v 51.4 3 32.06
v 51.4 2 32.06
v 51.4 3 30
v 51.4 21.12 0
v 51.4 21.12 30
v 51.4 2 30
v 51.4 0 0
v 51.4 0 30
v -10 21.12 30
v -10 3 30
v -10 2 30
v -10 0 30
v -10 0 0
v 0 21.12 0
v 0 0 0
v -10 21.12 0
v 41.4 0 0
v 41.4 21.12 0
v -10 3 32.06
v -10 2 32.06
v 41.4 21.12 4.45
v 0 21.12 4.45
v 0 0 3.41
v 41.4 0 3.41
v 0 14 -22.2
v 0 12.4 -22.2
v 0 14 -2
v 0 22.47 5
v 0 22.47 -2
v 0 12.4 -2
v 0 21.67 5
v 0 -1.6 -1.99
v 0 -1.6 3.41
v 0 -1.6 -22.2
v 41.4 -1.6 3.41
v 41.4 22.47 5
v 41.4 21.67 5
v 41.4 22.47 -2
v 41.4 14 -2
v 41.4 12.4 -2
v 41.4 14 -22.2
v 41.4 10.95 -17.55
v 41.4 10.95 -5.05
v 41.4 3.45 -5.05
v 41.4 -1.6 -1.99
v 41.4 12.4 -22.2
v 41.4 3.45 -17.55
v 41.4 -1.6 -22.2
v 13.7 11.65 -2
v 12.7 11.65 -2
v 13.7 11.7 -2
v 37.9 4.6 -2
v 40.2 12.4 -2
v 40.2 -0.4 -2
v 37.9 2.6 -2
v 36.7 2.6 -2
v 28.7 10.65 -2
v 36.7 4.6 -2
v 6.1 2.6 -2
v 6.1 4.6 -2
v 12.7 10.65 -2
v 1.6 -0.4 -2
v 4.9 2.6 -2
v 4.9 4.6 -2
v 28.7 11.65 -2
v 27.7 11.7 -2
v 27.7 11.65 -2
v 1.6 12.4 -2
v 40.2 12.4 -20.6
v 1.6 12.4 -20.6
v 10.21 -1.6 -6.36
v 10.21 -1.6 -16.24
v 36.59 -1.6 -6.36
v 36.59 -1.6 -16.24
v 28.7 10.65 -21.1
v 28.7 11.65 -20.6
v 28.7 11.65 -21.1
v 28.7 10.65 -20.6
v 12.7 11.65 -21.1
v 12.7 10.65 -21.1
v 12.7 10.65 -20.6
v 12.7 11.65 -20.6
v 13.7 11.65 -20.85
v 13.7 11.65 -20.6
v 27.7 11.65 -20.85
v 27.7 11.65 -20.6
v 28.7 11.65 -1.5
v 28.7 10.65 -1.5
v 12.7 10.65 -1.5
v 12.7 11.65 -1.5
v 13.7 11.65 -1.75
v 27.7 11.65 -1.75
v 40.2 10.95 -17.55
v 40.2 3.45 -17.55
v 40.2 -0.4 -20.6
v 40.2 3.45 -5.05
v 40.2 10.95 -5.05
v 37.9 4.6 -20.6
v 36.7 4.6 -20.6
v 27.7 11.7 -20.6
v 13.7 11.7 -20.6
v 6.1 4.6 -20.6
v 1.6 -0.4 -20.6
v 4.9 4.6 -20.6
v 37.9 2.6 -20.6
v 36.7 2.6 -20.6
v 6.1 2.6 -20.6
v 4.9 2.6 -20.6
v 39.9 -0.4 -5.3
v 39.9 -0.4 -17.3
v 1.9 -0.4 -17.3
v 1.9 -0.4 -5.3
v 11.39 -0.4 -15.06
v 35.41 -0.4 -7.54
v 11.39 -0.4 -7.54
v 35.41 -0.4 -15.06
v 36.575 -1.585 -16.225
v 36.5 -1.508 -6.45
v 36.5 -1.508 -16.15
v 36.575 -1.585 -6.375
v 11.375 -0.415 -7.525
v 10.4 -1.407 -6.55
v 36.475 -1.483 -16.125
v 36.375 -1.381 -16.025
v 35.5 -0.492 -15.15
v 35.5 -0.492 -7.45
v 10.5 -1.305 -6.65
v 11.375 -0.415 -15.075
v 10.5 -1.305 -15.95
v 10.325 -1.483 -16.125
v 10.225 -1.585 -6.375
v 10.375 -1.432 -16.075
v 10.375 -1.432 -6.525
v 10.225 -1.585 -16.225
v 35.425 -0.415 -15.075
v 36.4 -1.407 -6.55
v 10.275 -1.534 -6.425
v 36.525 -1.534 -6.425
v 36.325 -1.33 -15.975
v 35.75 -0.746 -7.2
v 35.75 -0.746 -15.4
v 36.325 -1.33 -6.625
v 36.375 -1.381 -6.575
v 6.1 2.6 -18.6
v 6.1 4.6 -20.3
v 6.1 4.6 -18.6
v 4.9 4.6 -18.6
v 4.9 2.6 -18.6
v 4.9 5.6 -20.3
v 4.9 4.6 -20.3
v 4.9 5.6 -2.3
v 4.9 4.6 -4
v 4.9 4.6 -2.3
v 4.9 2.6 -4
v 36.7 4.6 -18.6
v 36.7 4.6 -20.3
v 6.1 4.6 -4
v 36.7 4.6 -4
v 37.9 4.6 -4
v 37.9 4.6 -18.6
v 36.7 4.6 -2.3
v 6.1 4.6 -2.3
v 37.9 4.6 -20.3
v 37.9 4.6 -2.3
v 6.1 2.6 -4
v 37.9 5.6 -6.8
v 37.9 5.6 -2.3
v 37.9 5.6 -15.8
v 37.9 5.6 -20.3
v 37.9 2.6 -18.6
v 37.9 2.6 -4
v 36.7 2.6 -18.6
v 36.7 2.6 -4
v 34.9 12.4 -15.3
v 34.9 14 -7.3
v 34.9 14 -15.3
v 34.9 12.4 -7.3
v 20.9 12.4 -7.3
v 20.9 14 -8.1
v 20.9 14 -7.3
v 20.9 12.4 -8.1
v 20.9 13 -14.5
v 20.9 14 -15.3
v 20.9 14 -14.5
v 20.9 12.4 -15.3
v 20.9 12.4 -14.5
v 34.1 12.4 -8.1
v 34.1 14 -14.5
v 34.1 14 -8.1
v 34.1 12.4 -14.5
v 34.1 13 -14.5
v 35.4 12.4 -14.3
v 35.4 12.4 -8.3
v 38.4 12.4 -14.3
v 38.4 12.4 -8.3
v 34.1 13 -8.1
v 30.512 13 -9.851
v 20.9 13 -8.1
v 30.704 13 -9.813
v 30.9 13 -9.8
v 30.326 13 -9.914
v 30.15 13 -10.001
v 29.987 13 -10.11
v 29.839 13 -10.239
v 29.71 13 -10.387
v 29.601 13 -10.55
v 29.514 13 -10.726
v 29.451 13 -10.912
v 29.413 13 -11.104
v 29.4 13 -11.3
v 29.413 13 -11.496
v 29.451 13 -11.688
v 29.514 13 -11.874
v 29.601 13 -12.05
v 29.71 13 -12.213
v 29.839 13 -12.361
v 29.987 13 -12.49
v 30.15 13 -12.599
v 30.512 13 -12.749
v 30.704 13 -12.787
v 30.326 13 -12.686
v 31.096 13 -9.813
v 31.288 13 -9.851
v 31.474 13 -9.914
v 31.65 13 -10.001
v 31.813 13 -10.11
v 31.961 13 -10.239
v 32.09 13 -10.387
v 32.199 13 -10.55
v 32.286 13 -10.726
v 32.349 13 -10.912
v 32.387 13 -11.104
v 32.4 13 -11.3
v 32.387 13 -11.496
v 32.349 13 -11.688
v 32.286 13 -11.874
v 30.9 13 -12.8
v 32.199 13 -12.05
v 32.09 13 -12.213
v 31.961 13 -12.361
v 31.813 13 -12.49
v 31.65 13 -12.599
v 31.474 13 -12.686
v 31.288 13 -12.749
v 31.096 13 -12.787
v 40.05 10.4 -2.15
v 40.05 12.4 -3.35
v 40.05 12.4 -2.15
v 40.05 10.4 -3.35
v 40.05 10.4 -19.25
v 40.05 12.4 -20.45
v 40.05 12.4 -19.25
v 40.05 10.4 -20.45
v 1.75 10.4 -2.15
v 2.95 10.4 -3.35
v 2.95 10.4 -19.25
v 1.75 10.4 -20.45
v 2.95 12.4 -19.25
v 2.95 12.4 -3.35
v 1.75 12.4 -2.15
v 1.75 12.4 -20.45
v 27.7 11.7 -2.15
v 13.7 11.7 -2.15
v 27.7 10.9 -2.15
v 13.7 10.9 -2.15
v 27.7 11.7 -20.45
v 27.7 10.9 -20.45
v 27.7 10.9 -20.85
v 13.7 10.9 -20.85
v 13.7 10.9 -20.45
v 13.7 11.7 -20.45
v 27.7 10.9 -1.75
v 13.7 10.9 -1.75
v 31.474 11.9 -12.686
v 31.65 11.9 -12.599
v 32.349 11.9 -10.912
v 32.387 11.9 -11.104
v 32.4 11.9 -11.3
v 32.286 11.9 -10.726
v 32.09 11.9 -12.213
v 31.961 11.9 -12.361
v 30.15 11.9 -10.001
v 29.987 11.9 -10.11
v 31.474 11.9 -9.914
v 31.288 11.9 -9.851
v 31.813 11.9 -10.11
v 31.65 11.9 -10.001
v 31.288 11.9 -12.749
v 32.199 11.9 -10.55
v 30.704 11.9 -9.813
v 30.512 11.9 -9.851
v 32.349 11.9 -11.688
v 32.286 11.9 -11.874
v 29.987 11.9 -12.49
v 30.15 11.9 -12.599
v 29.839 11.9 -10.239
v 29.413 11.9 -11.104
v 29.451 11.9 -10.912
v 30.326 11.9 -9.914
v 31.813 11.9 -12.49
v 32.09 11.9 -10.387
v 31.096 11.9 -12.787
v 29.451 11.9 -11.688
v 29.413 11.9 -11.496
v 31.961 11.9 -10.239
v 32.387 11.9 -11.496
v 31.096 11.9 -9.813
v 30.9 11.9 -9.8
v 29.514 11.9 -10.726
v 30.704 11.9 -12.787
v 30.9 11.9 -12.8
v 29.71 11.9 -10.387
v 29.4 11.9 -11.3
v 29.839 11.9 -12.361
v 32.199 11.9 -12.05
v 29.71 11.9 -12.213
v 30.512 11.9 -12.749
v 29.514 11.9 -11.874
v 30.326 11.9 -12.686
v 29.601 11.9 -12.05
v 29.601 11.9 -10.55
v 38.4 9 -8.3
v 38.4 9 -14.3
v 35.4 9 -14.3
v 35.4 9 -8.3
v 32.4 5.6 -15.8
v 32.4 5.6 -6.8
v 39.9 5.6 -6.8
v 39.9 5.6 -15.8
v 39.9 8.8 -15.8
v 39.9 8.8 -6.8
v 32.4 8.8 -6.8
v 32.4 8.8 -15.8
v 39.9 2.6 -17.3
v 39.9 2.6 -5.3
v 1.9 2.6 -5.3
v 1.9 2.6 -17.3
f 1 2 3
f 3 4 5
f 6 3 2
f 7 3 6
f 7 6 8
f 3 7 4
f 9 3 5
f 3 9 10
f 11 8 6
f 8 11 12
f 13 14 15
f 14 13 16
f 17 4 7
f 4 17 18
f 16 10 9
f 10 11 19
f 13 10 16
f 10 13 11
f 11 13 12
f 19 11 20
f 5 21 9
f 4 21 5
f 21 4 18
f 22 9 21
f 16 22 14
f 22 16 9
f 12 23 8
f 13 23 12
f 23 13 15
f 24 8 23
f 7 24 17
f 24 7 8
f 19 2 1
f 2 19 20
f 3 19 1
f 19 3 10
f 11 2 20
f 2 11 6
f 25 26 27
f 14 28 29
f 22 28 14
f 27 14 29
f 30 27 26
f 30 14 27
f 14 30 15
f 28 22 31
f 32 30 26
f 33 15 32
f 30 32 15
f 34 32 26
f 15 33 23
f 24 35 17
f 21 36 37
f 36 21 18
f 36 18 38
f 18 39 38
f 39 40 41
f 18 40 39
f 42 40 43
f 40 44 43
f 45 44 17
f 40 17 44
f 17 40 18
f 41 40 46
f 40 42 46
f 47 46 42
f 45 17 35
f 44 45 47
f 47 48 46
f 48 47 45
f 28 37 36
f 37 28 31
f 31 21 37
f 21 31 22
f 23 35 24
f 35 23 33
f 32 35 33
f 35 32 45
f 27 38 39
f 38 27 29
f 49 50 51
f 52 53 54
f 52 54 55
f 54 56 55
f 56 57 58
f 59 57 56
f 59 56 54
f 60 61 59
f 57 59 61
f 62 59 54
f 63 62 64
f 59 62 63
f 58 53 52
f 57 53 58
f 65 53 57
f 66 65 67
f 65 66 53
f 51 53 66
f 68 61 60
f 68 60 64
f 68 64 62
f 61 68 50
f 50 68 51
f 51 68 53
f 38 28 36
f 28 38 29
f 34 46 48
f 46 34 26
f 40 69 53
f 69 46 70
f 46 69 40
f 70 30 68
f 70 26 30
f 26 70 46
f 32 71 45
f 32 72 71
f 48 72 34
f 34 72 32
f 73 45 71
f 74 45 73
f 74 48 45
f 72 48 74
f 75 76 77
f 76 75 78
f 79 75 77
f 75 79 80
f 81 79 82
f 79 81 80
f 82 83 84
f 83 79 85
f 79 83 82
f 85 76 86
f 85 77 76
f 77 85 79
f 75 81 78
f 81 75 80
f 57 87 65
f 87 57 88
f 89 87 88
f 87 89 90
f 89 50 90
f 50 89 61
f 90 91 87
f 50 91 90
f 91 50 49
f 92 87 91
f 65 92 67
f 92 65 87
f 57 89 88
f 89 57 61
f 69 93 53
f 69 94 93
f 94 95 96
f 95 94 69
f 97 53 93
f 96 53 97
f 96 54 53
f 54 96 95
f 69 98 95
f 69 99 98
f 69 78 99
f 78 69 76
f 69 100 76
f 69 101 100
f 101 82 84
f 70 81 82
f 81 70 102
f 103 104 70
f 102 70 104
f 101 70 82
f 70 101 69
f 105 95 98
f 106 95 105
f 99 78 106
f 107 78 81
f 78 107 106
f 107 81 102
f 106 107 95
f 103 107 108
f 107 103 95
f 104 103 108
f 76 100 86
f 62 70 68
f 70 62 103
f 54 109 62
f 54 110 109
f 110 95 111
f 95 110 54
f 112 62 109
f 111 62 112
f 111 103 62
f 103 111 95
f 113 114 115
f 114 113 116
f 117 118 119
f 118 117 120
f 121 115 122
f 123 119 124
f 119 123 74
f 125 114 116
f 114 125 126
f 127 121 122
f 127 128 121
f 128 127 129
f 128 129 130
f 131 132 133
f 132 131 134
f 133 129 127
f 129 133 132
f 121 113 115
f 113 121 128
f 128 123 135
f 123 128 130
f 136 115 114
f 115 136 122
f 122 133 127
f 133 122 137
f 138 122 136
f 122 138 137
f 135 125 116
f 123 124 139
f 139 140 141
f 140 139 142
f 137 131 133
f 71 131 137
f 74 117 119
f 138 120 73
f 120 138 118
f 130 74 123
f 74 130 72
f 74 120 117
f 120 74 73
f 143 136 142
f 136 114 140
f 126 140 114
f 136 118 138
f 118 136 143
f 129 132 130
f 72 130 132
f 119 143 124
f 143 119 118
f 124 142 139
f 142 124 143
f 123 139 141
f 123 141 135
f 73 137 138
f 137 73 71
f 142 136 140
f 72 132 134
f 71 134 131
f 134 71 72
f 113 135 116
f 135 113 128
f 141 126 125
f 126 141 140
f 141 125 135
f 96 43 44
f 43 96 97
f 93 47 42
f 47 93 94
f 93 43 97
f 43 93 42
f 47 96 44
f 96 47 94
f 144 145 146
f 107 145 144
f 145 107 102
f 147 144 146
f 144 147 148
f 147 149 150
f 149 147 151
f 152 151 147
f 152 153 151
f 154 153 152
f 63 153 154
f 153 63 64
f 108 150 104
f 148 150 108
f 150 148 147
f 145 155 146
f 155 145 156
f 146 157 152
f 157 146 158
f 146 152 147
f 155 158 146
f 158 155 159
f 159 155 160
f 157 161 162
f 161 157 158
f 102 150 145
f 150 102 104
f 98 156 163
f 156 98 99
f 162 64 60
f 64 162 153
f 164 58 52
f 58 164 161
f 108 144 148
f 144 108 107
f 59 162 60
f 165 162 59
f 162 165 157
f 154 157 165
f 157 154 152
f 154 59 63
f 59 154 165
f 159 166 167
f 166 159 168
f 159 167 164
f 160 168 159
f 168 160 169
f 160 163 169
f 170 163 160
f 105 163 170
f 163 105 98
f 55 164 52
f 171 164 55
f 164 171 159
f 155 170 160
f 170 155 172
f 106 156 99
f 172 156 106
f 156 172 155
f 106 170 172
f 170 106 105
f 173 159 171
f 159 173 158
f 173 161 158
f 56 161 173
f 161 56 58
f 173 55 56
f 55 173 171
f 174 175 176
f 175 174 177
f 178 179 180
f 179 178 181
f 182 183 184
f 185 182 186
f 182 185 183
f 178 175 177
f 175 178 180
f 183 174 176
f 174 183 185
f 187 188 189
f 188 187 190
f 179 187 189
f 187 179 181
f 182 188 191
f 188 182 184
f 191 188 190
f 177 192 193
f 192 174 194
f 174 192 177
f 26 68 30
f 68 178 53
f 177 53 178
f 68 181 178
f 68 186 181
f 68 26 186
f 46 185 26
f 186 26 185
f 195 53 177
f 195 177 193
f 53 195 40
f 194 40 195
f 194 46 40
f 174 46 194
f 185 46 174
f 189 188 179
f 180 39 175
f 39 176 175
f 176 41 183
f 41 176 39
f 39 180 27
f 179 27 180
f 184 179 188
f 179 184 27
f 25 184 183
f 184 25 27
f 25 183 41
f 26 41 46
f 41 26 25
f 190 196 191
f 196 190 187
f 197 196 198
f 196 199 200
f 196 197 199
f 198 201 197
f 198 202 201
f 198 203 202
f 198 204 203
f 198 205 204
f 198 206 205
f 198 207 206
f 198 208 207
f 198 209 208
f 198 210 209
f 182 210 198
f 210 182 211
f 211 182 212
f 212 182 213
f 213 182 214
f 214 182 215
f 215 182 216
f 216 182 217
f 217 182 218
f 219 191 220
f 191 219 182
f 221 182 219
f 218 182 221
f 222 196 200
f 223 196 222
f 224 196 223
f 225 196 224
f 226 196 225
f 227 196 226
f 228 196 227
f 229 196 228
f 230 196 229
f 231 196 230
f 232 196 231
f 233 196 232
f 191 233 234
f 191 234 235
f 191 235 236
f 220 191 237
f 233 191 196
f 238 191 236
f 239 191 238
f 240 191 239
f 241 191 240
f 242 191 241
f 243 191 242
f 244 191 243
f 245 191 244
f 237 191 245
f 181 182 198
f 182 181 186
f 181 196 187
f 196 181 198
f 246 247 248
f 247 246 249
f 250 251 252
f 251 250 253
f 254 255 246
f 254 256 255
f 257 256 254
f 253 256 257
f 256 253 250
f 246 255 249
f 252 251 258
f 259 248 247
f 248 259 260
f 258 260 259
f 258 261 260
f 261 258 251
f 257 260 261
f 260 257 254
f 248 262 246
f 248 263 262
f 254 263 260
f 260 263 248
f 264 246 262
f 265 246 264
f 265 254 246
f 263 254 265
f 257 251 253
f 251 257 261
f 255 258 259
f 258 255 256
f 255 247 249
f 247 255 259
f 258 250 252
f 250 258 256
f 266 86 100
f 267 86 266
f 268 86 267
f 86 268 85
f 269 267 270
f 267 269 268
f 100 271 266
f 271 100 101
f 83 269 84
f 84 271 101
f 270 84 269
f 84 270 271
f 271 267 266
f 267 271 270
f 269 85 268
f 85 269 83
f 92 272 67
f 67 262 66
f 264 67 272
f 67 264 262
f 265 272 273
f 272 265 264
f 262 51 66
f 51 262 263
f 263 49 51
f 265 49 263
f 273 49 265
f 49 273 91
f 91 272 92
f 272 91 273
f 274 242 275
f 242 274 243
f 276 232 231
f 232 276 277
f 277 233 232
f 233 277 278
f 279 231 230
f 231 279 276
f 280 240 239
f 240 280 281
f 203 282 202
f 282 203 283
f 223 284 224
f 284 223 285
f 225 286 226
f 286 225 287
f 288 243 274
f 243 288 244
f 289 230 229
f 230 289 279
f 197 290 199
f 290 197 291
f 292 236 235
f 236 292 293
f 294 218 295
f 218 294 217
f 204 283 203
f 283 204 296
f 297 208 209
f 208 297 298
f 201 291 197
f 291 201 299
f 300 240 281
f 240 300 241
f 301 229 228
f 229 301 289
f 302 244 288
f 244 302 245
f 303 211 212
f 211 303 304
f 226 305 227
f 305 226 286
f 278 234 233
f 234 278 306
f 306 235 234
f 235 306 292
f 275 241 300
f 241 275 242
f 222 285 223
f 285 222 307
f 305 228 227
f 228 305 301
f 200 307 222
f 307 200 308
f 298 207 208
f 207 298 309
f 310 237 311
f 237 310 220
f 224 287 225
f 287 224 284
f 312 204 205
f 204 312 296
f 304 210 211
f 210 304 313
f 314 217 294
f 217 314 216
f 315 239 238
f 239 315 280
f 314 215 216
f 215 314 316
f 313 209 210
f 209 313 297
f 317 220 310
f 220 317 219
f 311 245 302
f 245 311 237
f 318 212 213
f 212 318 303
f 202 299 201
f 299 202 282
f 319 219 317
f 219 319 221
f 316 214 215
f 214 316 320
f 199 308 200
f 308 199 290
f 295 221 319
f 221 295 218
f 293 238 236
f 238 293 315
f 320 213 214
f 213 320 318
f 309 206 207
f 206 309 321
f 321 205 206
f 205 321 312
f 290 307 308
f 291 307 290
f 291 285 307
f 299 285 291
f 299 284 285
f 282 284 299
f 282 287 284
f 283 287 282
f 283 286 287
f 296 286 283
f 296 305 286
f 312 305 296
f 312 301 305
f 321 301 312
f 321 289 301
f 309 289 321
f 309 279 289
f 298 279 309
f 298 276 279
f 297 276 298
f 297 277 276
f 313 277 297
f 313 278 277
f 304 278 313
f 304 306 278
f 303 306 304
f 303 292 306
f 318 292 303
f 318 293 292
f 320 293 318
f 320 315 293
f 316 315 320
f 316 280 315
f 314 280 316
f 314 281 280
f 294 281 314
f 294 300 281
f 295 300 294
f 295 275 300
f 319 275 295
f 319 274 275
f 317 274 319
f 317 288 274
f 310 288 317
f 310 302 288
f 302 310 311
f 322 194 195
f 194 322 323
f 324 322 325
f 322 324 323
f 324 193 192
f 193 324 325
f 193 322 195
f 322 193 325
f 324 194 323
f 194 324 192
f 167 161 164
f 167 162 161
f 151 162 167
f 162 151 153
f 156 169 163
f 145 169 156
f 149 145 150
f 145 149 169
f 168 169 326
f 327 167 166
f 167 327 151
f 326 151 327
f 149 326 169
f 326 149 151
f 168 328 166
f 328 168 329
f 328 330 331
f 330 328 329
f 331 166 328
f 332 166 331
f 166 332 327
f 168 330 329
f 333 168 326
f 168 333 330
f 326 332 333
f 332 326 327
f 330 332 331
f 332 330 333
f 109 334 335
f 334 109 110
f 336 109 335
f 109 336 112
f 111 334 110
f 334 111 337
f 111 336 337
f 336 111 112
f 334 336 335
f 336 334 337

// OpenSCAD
// nRFMicro + 0.91" SSD1306 OLED dongle case that clips onto the monitor's
// bottom edge. The case hangs just below the bezel with the OLED facing you.
//
// Side view (you sit on the left):
//
//          glass |
//        tooth __|      <- hooks over the 2 mm lip that sticks out
//             |##| lip  ##################  monitor
//             |##############################|
//             |<---------- depth ----------->|| <- back jaw
//             |=============plate=============|
//      OLED ->|[o|  |nRF|parts]|lid
//      window |________________|
//
// Inside, front -> back: OLED (glass toward the window), wire gap,
// nRFMicro (parts facing the back lid, reset button reachable via the lid tab).
//
// Coordinates: X = along the monitor width, Y = front -> back, Z = up.
// Origin = front-bottom corner of the monitor lip (z = 0 is the underside).
//
// part = "assembly" | "clip" | "lid" | "test" | "section" | "assembled"
part = "assembly";

/* ---------- monitor (measured) ---------- */
depth        = 21.12; // underside, front of lip -> back face
lip_h        = 2.06;  // lip thickness (vertical)
lip_proud    = 2.0;   // how far the lip sticks out past the glass
grip_interf  = 0.25;  // jaw squeeze; raise if loose, lower if it won't snap on

/* ---------- nRFMicro (verify with calipers) ---------- */
board_l      = 33.0;
board_w      = 18.0;
board_t      = 1.0;
top_clear    = 6.8;   // tallest top-side part (reset button) + margin
button_h     = 6.0;   // reset button height above the PCB (measured)
button_from_tip = 9.0; // button centre distance from the USB-C tip (measured)
usb_over     = 2.0;   // USB-C overhang past the PCB end (measured 1-2)
usb_h        = 3.2;   // USB-C receptacle height above the PCB

/* ---------- 0.91" 128x32 OLED module (verify) ---------- */
oled_l       = 38.0;  // PCB length (pins on one short end)
oled_w       = 12.0;  // PCB height
oled_t       = 3.0;   // glass + PCB thickness
glass_l      = 30.0;
glass_off    = 1.5;   // glass distance from the non-pin end of the PCB
win_l        = 24.0;  // window over the 22.4 x 5.6 active area
win_h        = 7.5;
win_dz       = 0.0;   // nudge the window up/down if the active area is off-centre
wire_gap     = 2.0;   // OLED back -> nRFMicro back (wires, solder joints)

usb_end_right = true; // USB faces +X; false mirrors the whole case

/* ---------- print ---------- */
wall     = 1.6;
front_t  = 1.2;   // front wall with the window
usb_wall = 1.2;   // thin end wall so the plug seats fully
plate    = 2.0;
fit      = 0.3;
lid_t    = 1.6;
lid_clear = 0.15;
skirt_h  = 2.0;
skirt_t  = 1.2;
snap     = 0.4;

tooth_d  = 1.4;   // must stay < lip_proud so it never covers the screen
tooth_t  = 1.2;
tooth_clr = 0.15;
back_h   = 5.0;
back_t   = 1.6;

$fn = 48;

/* ---------- derived ---------- */
cav_l = max(board_l, oled_l) + 2*fit;
cav_h = max(board_w, oled_w) + 2*fit;           // Z
cav_d = oled_t + wire_gap + board_t + top_clear;  // Y
L     = wall + cav_l + usb_wall;
y0    = -wall;                  // front face of the case / front jaw
yf    = y0 + front_t;           // inner face of the front wall
yback = yf + cav_d;             // open back of the cavity (lid goes here)
y1    = depth - grip_interf;    // inner face of the back jaw
yb    = y1 + back_t;
zt    = -plate;                 // cavity top
zb    = zt - cav_h;             // cavity bottom
zc    = (zt + zb) / 2;
cx0   = wall;
cx1   = wall + cav_l;           // USB-end inner wall
yn    = yf + oled_t + wire_gap; // nRFMicro back face
nx1   = cx1 - fit - usb_over;   // nRFMicro PCB USB end (USB tip sits at cx1 - fit)
nx0   = nx1 - board_l;          // nRFMicro antenna end
ox1   = cx0 + fit + oled_l;     // OLED non-pin end (pins at the antenna end)
win_cx = ox1 - glass_off - glass_l/2;

module xmirror() { if (usb_end_right) children(); else translate([L,0,0]) mirror([1,0,0]) children(); }

module profile() { // YZ profile of plate + jaws, extruded along X
  polygon([
    [y0, -plate], [yb, -plate], [yb, 0],
    [yb, back_h], [y1 + 0.8, back_h], [y1, back_h - 0.8], [y1, 0],
    [0, 0], [0, lip_h + tooth_clr],
    [tooth_d, lip_h + tooth_clr],
    [tooth_d, lip_h + tooth_clr + tooth_t*0.4],
    [tooth_d - 0.6, lip_h + tooth_clr + tooth_t],
    [y0, lip_h + tooth_clr + tooth_t],
  ]);
}

module clip() {
  xmirror() {
    difference() {
      union() {
        rotate([90,0,90]) linear_extrude(L) profile();
        translate([0, y0, zb - wall]) cube([L, yback - y0, cav_h + wall + 0.01]);
      }
      // cavity, open at the back
      translate([cx0, yf, zb]) cube([cav_l, cav_d + 1, cav_h]);
      // OLED window, chamfered outward for viewing angle
      translate([win_cx, y0 - 0.01, zc + win_dz]) rotate([-90,0,0])
        linear_extrude(front_t + 0.02, scale = [win_l/(win_l + 2*front_t), win_h/(win_h + 2*front_t)])
          square([win_l + 2*front_t, win_h + 2*front_t], center = true);
      // USB-C opening, sized for a typical plug overmold
      translate([cx1 - 1, yn + board_t + usb_h/2 - 3.75, zc - 6.25]) cube([usb_wall + 2, 7.5, 12.5]);
      // snap grooves (top + bottom inner walls) for the lid skirt
      for (z = [zb - snap - 0.1, zt - 0.01])
        translate([L/2 - 8, yback - lid_clear - 0.6 - 1.0, z]) cube([16, 1.0, snap + 0.11]);
    }
    // corner posts: hold the OLED against the window and space the nRFMicro off it
    for (x = [nx0, nx1 - 1.2], z = [zb, zt - 2])
      translate([x, yf + oled_t, z]) cube([1.2, wire_gap, 2]);
  }
}

module lid() { // modelled lying flat: outside face on z = 0, skirt + nubs up
  gap = top_clear - button_h;
  // lid-local x matches the case x; lid-local y = case z measured up from the box bottom
  zl = function(z) z - (zb - wall);
  bx = cx1 - fit - button_from_tip;
  by = zl(zc);
  hgt = cav_h + wall + plate;
  xmirror() {
    difference() {
      cube([L, hgt, lid_t]);
      // U-slot forming a flexible press tab over the reset button (root toward the antenna end)
      translate([bx, by, -1]) difference() {
        translate([-10, -4, 0]) cube([14, 8, lid_t + 2]);
        translate([-10.8, -3.2, -1]) cube([14, 6.4, lid_t + 4]);
      }
      translate([bx - 10, by - 3.2, lid_t - 0.6]) cube([13.2, 6.4, 1]);
    }
    translate([bx, by, lid_t - 0.6]) cylinder(d = 3, h = gap - 0.3 + 0.6);
    // rib that presses on the USB-C shell, keeping the board seated on the posts
    translate([cx1 - fit - 4.5, by - 3, lid_t]) cube([3, 6, top_clear - usb_h - 0.2]); // clear of the tab slot
    // skirt (open on the USB end so the plug isn't blocked)
    translate([cx0 + lid_clear, zl(zb) + lid_clear, lid_t]) difference() {
      cube([cav_l - 2*lid_clear, cav_h - 2*lid_clear, skirt_h]);
      translate([skirt_t, skirt_t, -1]) cube([cav_l, cav_h - 2*lid_clear - 2*skirt_t, skirt_h + 2]);
    }
    for (s = [0, 1])
      translate([L/2 - 7, s ? zl(zt) - lid_clear : zl(zb) + lid_clear - snap, lid_t + 0.7])
        cube([14, snap, 0.8]);
  }
}

module lid_placed() { // lid in its closed position on the back of the case
  translate([0, yback + lid_t, zb - wall]) rotate([90, 0, 0]) lid();
}

module test() { linear_extrude(10) profile(); } // prints flat, profile on the bed

module monitor() {
  color("dimgray", 0.5) translate([-10, 0, 0]) {
    cube([L + 20, depth, 30]);
    translate([0, lip_proud, lip_h]) cube([L + 20, 1, 30]);
  }
}

module boards() { // ghost boards for checking fit
  xmirror() {
    color("green") translate([nx0, yn, zc - board_w/2]) cube([board_l, board_t, board_w]);
    color("silver") translate([nx1 + usb_over - 7.5, yn + board_t, zc - 4.5]) cube([7.5, usb_h, 9]);
    color("black") translate([cx0 + fit, yf, zc - oled_w/2]) cube([oled_l, oled_t, oled_w]);
  }
}

if (part == "clip") translate([0, 0, L]) rotate([0, 90, 0]) clip(); // stands on its USB end (flat face on the bed), no supports
else if (part == "plate") { translate([0, 0, L]) rotate([0, 90, 0]) clip(); translate([-zb + wall + 8, y0, 0]) lid(); } // both parts, print layout
else if (part == "lid") lid();
else if (part == "test") test();
else if (part == "assembled") { clip(); lid_placed(); }
else if (part == "section")
  intersection() {
    translate([(usb_end_right ? cx1 - fit - button_from_tip : L - cx1 + fit + button_from_tip) - 0.25, -50, -50]) cube([0.5, 100, 100]);
    union() { clip(); lid_placed(); boards(); }
  }
else { monitor(); color("steelblue") clip(); color("lightsteelblue") lid_placed(); boards(); }
